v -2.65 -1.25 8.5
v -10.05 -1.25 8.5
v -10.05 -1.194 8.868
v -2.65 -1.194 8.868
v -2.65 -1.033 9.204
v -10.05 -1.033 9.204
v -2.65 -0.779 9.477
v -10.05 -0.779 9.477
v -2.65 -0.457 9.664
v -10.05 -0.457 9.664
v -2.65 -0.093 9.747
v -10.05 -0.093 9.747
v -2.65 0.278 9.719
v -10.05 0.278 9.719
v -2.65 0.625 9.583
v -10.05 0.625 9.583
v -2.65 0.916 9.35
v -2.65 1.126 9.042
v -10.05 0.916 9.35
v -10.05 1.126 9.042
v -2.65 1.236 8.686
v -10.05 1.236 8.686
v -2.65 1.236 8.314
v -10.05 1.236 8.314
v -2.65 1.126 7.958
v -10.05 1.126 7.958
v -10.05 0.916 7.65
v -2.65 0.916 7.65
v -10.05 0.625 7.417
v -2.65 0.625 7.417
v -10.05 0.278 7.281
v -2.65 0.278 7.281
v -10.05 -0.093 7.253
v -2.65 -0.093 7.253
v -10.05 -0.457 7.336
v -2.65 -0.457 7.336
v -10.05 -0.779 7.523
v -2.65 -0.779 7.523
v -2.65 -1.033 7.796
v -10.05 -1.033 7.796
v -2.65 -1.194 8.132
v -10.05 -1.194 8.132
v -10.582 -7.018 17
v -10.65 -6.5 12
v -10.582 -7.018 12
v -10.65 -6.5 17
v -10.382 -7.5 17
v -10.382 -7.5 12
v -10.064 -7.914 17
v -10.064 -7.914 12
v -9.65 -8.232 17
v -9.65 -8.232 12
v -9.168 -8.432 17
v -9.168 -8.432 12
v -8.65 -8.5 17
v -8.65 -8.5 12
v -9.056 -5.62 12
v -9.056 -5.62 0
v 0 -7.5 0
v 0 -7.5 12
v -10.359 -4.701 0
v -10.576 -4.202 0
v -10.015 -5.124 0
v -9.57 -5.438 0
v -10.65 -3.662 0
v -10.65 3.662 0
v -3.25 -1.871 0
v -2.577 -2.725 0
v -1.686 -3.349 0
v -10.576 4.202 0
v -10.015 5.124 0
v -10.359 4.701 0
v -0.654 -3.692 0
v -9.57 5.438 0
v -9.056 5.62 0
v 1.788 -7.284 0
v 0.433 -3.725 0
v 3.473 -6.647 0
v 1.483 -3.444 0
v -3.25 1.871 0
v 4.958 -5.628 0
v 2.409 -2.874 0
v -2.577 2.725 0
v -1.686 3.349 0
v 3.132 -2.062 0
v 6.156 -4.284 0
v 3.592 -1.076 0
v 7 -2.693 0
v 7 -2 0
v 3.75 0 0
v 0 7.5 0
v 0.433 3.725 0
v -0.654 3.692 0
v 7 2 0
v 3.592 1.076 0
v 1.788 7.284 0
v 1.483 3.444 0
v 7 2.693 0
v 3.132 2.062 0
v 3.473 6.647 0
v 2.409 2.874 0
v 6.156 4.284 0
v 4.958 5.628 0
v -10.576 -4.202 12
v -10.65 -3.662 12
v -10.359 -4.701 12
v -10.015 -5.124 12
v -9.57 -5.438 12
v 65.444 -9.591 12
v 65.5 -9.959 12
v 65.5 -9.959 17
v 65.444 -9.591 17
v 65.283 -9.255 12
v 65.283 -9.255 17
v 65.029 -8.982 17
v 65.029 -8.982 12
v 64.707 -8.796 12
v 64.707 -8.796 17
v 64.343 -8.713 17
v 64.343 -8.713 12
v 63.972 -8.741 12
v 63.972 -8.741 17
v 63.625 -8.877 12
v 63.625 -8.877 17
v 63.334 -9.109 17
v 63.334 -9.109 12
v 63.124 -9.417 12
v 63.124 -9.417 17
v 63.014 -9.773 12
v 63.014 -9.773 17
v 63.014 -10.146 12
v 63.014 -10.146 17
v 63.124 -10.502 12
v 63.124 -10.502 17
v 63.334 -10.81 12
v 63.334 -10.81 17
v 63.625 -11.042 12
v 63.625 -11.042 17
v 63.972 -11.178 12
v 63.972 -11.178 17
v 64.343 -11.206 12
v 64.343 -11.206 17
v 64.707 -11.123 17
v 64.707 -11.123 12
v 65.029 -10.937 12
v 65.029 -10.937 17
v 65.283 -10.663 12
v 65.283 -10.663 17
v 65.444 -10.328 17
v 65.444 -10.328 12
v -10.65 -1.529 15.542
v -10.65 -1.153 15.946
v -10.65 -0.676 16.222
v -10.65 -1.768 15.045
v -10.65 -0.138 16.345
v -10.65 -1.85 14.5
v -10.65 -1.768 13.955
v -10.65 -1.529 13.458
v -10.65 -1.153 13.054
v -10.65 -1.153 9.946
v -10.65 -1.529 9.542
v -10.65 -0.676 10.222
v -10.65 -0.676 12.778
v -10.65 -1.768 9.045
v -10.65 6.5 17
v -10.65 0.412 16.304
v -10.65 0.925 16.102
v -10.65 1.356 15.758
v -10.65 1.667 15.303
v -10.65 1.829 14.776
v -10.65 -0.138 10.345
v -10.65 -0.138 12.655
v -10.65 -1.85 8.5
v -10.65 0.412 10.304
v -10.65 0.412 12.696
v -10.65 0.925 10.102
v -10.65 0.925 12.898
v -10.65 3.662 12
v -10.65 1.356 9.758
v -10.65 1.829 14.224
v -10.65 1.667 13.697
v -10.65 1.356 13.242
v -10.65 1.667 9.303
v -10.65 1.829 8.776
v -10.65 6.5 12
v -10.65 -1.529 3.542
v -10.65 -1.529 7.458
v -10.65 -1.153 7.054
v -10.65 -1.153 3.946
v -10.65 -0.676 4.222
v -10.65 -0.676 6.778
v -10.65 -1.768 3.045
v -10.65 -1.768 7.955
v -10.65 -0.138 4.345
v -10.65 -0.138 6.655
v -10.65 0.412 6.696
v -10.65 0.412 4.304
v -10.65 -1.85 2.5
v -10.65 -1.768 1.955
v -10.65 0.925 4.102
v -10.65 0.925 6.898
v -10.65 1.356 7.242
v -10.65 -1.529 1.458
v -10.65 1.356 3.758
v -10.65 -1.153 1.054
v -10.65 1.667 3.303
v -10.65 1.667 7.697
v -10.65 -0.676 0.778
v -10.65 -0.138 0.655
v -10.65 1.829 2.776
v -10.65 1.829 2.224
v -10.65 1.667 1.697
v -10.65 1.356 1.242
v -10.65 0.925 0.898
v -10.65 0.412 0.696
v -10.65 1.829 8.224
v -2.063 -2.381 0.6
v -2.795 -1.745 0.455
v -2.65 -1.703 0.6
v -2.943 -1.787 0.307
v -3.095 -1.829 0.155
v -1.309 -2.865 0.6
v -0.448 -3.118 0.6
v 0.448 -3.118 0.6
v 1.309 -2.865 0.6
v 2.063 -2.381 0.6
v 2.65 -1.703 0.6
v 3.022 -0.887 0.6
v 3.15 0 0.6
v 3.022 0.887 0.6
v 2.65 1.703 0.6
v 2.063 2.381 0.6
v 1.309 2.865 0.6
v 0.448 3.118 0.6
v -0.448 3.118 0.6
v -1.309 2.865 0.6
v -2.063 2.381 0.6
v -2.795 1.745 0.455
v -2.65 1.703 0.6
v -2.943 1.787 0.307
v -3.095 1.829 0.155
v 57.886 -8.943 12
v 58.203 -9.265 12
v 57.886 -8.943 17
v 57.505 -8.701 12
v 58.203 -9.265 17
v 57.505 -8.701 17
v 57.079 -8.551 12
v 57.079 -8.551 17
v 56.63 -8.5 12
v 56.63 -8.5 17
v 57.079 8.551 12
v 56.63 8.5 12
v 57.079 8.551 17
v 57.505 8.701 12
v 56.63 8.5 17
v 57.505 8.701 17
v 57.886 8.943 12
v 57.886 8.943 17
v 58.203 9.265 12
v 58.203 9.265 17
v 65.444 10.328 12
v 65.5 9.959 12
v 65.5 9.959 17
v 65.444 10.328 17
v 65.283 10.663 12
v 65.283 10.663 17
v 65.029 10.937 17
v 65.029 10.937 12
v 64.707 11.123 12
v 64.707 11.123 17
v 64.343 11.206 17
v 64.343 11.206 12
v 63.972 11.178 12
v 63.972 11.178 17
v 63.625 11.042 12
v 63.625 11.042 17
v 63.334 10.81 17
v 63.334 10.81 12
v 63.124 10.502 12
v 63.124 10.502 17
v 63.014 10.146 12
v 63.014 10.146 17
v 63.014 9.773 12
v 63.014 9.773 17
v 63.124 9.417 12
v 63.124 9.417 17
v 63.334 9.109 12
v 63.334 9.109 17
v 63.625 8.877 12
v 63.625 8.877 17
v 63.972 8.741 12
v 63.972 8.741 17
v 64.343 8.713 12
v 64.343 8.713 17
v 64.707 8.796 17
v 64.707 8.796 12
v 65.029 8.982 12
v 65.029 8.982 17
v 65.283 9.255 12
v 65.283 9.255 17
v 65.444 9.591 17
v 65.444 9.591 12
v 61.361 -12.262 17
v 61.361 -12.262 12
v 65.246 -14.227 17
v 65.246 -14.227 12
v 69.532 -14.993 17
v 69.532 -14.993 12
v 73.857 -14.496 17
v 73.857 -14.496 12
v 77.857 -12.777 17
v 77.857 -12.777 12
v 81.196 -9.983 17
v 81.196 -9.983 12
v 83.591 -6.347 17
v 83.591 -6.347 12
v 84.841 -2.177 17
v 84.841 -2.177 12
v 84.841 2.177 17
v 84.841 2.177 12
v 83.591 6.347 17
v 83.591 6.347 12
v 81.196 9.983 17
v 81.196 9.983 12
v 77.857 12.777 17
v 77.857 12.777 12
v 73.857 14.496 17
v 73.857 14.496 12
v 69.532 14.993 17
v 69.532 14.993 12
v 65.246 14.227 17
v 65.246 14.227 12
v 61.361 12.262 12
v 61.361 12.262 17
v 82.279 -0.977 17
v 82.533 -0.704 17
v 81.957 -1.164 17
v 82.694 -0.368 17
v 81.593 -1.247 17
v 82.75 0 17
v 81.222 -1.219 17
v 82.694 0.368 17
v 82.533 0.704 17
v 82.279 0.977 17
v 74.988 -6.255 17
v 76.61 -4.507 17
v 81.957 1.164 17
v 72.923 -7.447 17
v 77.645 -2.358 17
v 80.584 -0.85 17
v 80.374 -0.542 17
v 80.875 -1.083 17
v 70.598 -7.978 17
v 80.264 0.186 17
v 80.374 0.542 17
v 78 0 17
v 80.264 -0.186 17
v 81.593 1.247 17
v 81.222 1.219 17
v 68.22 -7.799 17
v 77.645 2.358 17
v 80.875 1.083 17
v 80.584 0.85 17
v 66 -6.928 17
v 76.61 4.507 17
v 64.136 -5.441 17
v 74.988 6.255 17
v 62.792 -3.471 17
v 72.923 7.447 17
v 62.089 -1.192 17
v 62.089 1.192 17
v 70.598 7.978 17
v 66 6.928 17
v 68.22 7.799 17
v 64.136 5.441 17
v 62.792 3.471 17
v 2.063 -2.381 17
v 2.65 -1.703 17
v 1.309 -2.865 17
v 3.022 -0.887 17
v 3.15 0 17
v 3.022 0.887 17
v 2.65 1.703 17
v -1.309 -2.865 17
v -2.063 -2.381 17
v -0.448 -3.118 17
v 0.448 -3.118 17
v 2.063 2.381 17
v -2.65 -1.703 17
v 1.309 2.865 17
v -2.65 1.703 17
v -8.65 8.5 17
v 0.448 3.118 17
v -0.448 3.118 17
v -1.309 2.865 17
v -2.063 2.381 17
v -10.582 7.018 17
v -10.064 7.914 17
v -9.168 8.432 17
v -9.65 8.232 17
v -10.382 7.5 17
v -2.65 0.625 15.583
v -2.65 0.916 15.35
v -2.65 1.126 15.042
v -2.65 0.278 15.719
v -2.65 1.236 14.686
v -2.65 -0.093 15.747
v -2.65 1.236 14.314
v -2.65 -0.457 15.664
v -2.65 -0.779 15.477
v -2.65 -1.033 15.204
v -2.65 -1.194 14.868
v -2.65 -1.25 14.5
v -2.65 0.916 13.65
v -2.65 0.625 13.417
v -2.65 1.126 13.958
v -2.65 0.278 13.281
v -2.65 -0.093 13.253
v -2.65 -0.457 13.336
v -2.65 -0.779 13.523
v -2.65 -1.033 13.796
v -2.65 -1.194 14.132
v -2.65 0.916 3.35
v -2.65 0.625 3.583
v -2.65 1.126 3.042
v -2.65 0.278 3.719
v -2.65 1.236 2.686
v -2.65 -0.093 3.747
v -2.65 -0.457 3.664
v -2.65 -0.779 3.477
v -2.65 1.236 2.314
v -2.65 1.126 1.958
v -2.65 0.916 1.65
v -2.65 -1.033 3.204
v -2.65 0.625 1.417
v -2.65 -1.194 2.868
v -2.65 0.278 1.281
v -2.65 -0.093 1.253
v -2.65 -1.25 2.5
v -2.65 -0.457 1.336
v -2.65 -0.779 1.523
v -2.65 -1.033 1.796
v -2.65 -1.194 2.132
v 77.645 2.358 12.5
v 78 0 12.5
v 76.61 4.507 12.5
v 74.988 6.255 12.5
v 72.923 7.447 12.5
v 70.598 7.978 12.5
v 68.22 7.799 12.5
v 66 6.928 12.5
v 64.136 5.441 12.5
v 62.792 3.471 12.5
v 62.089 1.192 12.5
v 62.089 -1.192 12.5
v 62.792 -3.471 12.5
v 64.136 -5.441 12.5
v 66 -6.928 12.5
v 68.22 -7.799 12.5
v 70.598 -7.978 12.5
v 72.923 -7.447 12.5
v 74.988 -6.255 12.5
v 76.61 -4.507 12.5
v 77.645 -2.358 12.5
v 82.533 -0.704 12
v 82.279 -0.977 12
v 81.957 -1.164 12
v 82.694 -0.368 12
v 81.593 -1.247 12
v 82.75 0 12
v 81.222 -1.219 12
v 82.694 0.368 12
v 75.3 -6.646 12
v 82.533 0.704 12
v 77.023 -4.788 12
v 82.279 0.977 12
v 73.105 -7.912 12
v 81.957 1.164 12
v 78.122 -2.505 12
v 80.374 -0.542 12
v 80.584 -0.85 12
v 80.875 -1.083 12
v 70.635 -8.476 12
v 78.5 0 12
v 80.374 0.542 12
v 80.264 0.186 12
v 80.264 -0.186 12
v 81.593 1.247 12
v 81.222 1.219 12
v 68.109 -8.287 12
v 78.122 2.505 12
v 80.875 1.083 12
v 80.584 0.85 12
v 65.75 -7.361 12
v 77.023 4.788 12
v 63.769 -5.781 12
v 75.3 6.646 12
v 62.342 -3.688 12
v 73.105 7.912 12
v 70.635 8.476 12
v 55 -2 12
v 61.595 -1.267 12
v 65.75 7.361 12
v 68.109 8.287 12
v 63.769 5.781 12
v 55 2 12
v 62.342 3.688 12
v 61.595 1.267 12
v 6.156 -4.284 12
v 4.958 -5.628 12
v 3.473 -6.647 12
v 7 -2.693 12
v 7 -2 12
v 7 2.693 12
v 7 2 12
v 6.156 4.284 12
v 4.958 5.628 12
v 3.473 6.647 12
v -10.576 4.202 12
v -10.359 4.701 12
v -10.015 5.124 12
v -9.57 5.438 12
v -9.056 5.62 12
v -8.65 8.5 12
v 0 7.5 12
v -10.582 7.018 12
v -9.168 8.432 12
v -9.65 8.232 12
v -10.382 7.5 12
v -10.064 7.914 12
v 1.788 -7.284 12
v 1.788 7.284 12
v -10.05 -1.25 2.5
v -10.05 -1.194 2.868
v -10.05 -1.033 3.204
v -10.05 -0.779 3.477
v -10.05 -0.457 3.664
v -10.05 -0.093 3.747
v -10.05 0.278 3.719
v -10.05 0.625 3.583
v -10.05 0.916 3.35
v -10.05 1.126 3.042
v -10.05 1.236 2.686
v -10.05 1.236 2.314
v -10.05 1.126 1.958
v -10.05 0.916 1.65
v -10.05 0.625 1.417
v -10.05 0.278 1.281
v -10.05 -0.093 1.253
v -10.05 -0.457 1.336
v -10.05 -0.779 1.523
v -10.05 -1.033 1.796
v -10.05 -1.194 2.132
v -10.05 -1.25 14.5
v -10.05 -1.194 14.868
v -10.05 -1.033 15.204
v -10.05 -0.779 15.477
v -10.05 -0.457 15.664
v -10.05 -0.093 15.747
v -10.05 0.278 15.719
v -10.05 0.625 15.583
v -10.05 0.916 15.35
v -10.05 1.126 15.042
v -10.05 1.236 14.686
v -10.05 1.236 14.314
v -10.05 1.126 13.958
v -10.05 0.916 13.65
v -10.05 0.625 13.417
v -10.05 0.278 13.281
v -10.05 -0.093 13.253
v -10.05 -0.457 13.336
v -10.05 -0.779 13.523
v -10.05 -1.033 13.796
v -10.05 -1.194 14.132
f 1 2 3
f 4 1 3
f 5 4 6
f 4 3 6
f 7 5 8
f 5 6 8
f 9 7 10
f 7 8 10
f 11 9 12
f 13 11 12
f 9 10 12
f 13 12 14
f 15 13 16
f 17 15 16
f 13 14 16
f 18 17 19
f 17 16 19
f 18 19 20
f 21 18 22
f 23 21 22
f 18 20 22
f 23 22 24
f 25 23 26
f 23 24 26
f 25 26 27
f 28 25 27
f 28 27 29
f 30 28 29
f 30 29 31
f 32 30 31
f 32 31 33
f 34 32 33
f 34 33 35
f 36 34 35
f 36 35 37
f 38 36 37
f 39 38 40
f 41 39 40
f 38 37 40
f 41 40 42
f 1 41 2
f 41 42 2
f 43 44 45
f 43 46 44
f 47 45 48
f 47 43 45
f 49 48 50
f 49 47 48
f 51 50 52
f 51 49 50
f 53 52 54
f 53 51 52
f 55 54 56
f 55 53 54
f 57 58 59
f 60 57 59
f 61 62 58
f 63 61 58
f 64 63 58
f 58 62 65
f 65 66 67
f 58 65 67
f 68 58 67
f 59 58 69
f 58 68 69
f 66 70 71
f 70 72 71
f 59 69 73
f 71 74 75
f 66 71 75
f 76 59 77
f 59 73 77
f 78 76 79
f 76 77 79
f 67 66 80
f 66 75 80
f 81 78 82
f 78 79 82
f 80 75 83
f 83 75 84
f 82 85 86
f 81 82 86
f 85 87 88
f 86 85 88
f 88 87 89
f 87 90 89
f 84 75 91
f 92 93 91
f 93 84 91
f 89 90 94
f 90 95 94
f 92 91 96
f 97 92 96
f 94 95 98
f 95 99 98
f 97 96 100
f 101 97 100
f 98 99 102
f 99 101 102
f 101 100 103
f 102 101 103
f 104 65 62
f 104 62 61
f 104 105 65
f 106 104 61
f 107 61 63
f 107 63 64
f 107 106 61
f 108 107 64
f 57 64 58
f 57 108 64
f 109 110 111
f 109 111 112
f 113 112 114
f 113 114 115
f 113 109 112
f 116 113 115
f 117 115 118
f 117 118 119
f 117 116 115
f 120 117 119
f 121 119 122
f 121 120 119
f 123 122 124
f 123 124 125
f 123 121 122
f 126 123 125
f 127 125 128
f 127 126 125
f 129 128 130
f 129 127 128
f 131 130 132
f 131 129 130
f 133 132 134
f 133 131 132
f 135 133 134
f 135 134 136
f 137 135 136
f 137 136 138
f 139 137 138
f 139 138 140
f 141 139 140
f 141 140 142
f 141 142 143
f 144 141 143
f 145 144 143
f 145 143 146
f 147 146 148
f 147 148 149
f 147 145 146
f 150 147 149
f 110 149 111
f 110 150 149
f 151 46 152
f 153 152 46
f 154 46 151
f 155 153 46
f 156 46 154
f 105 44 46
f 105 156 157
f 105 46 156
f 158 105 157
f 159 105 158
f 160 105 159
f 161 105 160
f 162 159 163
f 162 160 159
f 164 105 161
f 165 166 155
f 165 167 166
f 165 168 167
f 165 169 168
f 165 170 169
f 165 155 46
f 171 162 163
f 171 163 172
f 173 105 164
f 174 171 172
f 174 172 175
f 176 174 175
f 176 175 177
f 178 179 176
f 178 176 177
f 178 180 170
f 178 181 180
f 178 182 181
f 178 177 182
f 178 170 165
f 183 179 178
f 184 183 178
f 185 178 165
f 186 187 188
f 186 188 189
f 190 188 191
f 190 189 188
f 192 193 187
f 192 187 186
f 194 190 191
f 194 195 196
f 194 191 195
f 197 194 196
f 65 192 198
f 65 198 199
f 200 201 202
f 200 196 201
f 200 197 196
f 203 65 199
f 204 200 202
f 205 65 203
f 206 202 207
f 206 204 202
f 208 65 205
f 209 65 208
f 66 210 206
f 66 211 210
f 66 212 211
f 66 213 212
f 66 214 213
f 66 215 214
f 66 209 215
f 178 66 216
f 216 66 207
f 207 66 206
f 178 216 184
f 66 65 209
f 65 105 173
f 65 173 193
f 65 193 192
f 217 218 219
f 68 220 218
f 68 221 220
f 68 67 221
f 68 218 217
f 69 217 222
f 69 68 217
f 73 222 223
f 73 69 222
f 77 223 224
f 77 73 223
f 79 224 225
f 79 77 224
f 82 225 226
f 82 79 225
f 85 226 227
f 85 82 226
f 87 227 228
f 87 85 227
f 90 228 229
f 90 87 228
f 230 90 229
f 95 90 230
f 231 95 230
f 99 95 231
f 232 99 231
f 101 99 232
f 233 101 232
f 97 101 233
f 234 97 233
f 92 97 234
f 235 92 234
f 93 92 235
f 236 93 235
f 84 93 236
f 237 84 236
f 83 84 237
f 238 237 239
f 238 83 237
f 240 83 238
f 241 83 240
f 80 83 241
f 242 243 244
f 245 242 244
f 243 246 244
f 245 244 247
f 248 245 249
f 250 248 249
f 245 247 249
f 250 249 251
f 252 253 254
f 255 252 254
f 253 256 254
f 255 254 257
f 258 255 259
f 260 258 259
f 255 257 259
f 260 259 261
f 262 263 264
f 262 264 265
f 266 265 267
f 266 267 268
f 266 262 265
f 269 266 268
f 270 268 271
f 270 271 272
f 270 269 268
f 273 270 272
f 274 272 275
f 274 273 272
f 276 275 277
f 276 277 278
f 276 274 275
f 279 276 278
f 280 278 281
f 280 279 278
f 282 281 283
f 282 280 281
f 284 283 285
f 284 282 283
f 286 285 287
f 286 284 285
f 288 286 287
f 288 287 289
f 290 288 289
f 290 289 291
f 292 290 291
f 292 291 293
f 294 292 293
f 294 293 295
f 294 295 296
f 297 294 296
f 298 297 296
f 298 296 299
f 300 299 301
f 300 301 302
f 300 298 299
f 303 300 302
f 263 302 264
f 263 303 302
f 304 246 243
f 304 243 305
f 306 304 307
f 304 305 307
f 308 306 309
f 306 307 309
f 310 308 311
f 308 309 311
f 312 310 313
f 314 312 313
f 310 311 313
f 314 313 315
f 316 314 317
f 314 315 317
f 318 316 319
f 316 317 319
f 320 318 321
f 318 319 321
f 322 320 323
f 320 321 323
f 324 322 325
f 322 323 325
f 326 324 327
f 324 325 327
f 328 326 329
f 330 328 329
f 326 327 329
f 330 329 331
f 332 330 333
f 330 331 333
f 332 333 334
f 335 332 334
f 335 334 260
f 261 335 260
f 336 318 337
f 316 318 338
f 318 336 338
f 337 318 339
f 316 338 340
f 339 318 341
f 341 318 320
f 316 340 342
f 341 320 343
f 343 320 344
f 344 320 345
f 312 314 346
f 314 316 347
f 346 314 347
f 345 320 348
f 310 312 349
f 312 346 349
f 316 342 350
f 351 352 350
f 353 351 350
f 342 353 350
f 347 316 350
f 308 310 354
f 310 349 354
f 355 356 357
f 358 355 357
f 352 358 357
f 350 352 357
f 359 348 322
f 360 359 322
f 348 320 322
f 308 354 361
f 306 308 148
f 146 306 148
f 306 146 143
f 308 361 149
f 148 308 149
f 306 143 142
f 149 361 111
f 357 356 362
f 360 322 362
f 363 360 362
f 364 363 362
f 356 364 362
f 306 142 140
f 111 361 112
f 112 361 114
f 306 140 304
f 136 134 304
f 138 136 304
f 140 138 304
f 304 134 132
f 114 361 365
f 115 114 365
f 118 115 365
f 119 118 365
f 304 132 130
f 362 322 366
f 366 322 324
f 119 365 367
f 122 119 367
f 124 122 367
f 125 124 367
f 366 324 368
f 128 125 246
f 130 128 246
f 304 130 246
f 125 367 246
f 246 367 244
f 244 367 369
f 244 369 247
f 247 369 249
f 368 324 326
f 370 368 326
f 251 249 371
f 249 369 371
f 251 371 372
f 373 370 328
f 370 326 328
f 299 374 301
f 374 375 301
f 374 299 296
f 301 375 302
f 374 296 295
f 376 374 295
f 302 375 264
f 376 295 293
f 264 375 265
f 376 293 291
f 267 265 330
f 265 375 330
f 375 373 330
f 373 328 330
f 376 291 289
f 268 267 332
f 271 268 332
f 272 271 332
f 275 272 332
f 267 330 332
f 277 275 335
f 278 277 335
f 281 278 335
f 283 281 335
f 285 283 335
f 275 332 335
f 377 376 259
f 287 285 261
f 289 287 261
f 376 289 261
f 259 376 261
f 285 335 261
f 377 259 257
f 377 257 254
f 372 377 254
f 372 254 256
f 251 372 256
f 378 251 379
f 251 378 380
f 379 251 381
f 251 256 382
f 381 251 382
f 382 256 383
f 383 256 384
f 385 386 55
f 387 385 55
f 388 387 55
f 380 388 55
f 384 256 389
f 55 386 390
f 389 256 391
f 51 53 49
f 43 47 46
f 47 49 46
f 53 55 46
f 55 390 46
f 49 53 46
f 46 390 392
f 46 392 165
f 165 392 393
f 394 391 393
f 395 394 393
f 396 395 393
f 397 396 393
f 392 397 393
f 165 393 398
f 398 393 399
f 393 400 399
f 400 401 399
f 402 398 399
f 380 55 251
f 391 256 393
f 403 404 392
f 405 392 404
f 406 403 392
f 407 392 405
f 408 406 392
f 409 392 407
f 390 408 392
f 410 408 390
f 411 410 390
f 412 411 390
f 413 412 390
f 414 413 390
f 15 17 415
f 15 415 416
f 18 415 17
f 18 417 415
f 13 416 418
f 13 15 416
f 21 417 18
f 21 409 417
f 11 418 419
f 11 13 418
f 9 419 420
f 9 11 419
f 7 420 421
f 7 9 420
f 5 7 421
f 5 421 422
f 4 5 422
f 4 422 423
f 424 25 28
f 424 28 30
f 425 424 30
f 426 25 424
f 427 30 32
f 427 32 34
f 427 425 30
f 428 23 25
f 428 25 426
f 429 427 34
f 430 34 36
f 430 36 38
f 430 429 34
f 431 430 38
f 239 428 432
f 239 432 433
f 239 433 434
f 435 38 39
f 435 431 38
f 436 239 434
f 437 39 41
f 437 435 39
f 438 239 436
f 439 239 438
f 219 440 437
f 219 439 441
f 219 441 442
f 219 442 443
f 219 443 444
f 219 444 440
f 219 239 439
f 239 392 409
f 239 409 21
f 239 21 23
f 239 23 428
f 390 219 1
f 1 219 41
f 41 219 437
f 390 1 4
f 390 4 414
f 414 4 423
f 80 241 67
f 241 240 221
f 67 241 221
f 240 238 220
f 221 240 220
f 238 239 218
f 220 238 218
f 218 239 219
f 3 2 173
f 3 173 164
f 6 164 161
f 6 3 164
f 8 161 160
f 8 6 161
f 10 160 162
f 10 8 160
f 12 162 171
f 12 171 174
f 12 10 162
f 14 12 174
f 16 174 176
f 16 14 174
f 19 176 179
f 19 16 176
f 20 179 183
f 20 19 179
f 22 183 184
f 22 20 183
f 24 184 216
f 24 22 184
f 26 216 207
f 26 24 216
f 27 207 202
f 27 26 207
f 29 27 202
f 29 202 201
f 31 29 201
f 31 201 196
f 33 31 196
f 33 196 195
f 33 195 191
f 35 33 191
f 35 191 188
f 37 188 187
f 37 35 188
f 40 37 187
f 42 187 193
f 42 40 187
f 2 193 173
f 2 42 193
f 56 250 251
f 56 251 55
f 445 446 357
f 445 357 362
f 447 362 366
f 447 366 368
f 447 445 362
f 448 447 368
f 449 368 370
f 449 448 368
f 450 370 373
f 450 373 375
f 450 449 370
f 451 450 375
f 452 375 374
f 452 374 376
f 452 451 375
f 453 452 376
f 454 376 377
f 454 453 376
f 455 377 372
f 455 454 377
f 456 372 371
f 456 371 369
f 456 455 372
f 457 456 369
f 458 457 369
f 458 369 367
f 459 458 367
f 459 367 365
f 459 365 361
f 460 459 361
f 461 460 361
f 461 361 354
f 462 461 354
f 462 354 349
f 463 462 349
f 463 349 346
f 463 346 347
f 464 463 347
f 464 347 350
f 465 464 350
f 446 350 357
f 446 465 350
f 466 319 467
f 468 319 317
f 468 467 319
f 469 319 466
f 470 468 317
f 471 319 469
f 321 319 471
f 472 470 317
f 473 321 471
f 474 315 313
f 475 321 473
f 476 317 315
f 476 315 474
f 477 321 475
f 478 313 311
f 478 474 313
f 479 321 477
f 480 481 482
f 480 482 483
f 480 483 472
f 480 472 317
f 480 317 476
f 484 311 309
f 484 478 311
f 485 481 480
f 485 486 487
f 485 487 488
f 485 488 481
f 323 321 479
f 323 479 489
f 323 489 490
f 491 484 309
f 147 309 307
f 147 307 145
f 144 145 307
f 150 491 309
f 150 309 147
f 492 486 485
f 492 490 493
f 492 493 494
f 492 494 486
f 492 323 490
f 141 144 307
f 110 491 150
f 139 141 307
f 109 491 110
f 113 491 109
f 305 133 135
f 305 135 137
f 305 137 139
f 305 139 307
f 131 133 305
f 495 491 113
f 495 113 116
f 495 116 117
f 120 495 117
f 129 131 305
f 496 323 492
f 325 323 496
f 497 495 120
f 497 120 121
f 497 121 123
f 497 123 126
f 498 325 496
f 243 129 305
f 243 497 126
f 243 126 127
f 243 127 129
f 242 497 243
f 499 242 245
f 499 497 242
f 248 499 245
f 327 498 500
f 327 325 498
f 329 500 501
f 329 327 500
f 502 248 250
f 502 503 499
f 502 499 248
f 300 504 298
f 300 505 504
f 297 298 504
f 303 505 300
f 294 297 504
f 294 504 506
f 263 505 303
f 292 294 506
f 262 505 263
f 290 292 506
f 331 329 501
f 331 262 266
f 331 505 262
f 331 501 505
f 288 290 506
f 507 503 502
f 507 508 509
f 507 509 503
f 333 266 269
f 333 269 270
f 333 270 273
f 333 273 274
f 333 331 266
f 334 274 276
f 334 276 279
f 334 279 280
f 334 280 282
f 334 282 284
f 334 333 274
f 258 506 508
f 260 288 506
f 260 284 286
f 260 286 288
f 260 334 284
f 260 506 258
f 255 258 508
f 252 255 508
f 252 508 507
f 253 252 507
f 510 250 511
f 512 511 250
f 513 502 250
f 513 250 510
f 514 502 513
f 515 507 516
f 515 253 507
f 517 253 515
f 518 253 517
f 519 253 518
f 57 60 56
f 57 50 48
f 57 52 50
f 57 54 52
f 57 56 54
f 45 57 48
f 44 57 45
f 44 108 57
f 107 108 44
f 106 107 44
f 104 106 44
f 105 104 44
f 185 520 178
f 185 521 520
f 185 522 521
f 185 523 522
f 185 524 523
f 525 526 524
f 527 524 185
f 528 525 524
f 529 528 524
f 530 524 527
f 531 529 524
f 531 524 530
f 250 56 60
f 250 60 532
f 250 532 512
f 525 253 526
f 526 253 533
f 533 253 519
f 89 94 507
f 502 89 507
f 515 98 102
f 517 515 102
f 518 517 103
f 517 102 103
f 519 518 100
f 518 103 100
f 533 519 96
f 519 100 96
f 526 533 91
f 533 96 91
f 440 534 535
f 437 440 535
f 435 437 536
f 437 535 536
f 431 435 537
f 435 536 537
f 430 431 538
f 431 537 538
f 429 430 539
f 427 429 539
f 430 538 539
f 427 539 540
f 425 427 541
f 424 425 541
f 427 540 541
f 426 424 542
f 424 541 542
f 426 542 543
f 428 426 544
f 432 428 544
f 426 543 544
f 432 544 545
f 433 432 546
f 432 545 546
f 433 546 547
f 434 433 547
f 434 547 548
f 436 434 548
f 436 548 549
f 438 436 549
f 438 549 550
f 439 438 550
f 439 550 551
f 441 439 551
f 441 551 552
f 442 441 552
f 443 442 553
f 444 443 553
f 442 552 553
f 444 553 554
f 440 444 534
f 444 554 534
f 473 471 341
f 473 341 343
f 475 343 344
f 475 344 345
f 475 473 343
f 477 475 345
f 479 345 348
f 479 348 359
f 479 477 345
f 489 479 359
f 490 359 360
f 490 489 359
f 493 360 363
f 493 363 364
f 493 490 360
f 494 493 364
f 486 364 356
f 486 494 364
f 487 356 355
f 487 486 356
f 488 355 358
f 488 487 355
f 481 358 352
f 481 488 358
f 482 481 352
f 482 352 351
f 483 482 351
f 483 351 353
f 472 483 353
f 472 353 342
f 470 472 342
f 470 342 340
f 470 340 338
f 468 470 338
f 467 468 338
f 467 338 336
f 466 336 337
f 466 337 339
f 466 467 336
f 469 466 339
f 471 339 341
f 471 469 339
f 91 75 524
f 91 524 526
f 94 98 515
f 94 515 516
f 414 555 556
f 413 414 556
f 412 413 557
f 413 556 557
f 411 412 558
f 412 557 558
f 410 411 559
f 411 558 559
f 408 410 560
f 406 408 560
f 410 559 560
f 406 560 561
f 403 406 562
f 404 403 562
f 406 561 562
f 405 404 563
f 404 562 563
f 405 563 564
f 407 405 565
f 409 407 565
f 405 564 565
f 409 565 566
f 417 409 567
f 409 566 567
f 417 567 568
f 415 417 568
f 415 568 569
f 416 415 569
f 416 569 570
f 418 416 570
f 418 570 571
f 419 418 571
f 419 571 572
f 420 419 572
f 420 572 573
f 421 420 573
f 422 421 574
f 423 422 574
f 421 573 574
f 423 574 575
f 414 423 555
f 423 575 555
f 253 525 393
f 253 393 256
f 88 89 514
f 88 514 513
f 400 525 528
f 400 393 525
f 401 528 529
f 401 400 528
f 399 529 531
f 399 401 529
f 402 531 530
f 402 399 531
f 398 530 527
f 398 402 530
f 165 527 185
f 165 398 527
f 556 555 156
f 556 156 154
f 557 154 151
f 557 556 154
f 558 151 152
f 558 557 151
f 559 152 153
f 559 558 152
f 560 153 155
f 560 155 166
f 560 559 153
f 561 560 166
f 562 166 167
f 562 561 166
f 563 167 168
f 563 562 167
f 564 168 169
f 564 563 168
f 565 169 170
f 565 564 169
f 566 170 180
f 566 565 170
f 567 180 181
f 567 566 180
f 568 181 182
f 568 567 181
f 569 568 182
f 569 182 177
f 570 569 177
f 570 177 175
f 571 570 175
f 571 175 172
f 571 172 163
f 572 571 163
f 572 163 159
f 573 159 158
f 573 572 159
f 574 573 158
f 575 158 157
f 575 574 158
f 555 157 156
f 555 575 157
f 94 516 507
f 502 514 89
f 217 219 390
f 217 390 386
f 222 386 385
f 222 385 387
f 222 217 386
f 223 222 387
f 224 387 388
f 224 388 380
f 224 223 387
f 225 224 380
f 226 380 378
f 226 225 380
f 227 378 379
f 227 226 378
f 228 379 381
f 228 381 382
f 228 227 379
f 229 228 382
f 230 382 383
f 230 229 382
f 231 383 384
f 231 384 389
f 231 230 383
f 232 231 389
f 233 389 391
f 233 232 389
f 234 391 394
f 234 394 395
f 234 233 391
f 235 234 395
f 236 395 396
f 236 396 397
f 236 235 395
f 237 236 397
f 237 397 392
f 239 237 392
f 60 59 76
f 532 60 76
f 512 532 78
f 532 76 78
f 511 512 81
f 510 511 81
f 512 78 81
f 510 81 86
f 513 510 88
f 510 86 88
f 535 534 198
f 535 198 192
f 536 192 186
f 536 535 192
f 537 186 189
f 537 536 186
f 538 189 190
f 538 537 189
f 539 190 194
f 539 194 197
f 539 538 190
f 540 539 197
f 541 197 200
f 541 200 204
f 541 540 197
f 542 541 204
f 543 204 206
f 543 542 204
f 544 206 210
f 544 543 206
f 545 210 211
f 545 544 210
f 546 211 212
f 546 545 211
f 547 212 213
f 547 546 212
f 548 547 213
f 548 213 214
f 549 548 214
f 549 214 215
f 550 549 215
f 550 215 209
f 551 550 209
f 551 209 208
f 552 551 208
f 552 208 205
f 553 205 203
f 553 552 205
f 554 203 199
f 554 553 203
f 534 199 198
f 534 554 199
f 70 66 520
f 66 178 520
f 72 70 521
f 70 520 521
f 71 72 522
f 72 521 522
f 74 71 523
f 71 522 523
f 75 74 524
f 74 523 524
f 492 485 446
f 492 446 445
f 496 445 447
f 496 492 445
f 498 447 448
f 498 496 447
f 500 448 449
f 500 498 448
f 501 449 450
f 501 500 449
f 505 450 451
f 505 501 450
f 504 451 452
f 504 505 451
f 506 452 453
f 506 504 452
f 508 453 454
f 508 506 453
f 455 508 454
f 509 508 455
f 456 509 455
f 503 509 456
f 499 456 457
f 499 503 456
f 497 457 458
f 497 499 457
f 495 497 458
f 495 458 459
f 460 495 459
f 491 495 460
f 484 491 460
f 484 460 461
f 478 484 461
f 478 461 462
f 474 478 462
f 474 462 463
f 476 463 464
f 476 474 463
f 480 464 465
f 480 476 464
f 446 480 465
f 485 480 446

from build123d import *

# Parameters (mm, degrees)
PAD_DEPTH       = 12
SKETCH004_R     = 8
SKETCH004_R_2   = 1.25
PAD001_DEPTH    = 5
SKETCH005_R     = 1.25
POCKET_DEPTH    = 8
PAD002_DEPTH    = 2
FILLET_R        = 2
CHAMFER_SIZE    = 0.6
CHAMFER001_SIZE = 0.5
FILLET001_R     = 2
FILLET002_R     = 2
CHAMFER002_SIZE = 0.6


with BuildPart() as part:
    # Sketch002 → Pad (new body)
    with BuildSketch(Plane.XY):
        with BuildLine():
            ThreePointArc((0, -7.5), (4.245918, -6.182409), (7, -2.692582))
            Line((7, 2.692582), (7, -2.692582))
            ThreePointArc((7, 2.692582), (4.245918, 6.182409), (0, 7.5))
            Line((-10.65, 5.289572), (0, 7.5))
            Line((-10.65, 5.289572), (-10.65, -5.289572))
            Line((-10.65, -5.289572), (0, -7.5))
        make_face()
        with BuildLine():
            ThreePointArc((-2.65, -1.702939), (3.15, 0), (-2.65, 1.702939))
            Line((-2.65, 1.702939), (-2.65, -1.702939))
        make_face(mode=Mode.SUBTRACT)
    extrude(amount=PAD_DEPTH)

    # Sketch004 → Pad001 (join)
    with BuildSketch(Plane.XY.offset(12)):
        with BuildLine():
            Line((-10.65, 8.5), (57.640793, 8.5))
            ThreePointArc((57.640793, -8.5), (85, 0), (57.640793, 8.5))
            Line((57.640793, -8.5), (-10.65, -8.5))
            Line((-10.65, -8.5), (-10.65, 8.5))
        make_face()
        with Locations((70, 0)):
            Circle(SKETCH004_R, mode=Mode.SUBTRACT)
        with Locations((64.25, 9.959292)):
            Circle(SKETCH004_R_2, mode=Mode.SUBTRACT)
        with Locations((81.5, 0)):
            Circle(SKETCH004_R_2, mode=Mode.SUBTRACT)
        with Locations((64.25, -9.959292)):
            Circle(SKETCH004_R_2, mode=Mode.SUBTRACT)
        with BuildLine():
            ThreePointArc((-2.65, -1.702939), (3.15, 0), (-2.65, 1.702939))
            Line((-2.65, 1.702939), (-2.65, -1.702939))
        make_face(mode=Mode.SUBTRACT)
    extrude(amount=PAD001_DEPTH)

    # Sketch005 (on Face1 of Pad001) → Pocket (cut)
    with BuildSketch(Plane(origin=(-10.65, 0, 0), x_dir=(0, -1, 0), z_dir=(-1, 0, 0))):
        with Locations((0, 14.5)):
            Circle(SKETCH005_R)
        with Locations((0, 8.5)):
            Circle(SKETCH005_R)
        with Locations((0, 2.5)):
            Circle(SKETCH005_R)
    extrude(amount=-POCKET_DEPTH, mode=Mode.SUBTRACT)

    # Sketch006 (on Face16 of Pocket) → Pad002 (join, symmetric)
    with BuildSketch(Plane(origin=(0, 0, 0), x_dir=(-1, 0, 0), z_dir=(0, 1, 0))):
        Polygon((-7, 0), (-55, 12), (-7, 12), align=None)
    extrude(amount=PAD002_DEPTH, both=True)

    # Fillet
    fillet_edges = [part.edges().sort_by_distance(p)[0] for p in [
        (-10.65, 8.5, 14.5),
        (-10.65, 5.289572, 6),
        (-10.65, -5.289572, 6),
        (-10.65, -8.5, 14.5),
    ]]
    fillet(fillet_edges, radius=FILLET_R)

    # Chamfer
    chamfer_edges = [part.edges().sort_by_distance(p)[0] for p in [
        (3.15, 0, 0),
        (-2.65, 0, 0),
    ]]
    chamfer(chamfer_edges, length=CHAMFER_SIZE)

    # Chamfer001
    chamfer001_edges = [part.edges().sort_by_distance(p)[0] for p in [
        (62, 0, 12),
    ]]
    chamfer(chamfer001_edges, length=CHAMFER001_SIZE)

    # Fillet001
    fillet001_edges = [part.edges().sort_by_distance(p)[0] for p in [
        (57.640793, 8.5, 14.5),
    ]]
    fillet(fillet001_edges, radius=FILLET001_R)

    # Fillet002
    fillet002_edges = [part.edges().sort_by_distance(p)[0] for p in [
        (57.640793, -8.5, 14.5),
    ]]
    fillet(fillet002_edges, radius=FILLET002_R)

    # Chamfer002
    chamfer002_edges = [part.edges().sort_by_distance(p)[0] for p in [
        (-10.65, 1.25, 2.5),
        (-10.65, 1.25, 8.5),
        (-10.65, 1.25, 14.5),
    ]]
    chamfer(chamfer002_edges, length=CHAMFER002_SIZE)


solid = part.part
